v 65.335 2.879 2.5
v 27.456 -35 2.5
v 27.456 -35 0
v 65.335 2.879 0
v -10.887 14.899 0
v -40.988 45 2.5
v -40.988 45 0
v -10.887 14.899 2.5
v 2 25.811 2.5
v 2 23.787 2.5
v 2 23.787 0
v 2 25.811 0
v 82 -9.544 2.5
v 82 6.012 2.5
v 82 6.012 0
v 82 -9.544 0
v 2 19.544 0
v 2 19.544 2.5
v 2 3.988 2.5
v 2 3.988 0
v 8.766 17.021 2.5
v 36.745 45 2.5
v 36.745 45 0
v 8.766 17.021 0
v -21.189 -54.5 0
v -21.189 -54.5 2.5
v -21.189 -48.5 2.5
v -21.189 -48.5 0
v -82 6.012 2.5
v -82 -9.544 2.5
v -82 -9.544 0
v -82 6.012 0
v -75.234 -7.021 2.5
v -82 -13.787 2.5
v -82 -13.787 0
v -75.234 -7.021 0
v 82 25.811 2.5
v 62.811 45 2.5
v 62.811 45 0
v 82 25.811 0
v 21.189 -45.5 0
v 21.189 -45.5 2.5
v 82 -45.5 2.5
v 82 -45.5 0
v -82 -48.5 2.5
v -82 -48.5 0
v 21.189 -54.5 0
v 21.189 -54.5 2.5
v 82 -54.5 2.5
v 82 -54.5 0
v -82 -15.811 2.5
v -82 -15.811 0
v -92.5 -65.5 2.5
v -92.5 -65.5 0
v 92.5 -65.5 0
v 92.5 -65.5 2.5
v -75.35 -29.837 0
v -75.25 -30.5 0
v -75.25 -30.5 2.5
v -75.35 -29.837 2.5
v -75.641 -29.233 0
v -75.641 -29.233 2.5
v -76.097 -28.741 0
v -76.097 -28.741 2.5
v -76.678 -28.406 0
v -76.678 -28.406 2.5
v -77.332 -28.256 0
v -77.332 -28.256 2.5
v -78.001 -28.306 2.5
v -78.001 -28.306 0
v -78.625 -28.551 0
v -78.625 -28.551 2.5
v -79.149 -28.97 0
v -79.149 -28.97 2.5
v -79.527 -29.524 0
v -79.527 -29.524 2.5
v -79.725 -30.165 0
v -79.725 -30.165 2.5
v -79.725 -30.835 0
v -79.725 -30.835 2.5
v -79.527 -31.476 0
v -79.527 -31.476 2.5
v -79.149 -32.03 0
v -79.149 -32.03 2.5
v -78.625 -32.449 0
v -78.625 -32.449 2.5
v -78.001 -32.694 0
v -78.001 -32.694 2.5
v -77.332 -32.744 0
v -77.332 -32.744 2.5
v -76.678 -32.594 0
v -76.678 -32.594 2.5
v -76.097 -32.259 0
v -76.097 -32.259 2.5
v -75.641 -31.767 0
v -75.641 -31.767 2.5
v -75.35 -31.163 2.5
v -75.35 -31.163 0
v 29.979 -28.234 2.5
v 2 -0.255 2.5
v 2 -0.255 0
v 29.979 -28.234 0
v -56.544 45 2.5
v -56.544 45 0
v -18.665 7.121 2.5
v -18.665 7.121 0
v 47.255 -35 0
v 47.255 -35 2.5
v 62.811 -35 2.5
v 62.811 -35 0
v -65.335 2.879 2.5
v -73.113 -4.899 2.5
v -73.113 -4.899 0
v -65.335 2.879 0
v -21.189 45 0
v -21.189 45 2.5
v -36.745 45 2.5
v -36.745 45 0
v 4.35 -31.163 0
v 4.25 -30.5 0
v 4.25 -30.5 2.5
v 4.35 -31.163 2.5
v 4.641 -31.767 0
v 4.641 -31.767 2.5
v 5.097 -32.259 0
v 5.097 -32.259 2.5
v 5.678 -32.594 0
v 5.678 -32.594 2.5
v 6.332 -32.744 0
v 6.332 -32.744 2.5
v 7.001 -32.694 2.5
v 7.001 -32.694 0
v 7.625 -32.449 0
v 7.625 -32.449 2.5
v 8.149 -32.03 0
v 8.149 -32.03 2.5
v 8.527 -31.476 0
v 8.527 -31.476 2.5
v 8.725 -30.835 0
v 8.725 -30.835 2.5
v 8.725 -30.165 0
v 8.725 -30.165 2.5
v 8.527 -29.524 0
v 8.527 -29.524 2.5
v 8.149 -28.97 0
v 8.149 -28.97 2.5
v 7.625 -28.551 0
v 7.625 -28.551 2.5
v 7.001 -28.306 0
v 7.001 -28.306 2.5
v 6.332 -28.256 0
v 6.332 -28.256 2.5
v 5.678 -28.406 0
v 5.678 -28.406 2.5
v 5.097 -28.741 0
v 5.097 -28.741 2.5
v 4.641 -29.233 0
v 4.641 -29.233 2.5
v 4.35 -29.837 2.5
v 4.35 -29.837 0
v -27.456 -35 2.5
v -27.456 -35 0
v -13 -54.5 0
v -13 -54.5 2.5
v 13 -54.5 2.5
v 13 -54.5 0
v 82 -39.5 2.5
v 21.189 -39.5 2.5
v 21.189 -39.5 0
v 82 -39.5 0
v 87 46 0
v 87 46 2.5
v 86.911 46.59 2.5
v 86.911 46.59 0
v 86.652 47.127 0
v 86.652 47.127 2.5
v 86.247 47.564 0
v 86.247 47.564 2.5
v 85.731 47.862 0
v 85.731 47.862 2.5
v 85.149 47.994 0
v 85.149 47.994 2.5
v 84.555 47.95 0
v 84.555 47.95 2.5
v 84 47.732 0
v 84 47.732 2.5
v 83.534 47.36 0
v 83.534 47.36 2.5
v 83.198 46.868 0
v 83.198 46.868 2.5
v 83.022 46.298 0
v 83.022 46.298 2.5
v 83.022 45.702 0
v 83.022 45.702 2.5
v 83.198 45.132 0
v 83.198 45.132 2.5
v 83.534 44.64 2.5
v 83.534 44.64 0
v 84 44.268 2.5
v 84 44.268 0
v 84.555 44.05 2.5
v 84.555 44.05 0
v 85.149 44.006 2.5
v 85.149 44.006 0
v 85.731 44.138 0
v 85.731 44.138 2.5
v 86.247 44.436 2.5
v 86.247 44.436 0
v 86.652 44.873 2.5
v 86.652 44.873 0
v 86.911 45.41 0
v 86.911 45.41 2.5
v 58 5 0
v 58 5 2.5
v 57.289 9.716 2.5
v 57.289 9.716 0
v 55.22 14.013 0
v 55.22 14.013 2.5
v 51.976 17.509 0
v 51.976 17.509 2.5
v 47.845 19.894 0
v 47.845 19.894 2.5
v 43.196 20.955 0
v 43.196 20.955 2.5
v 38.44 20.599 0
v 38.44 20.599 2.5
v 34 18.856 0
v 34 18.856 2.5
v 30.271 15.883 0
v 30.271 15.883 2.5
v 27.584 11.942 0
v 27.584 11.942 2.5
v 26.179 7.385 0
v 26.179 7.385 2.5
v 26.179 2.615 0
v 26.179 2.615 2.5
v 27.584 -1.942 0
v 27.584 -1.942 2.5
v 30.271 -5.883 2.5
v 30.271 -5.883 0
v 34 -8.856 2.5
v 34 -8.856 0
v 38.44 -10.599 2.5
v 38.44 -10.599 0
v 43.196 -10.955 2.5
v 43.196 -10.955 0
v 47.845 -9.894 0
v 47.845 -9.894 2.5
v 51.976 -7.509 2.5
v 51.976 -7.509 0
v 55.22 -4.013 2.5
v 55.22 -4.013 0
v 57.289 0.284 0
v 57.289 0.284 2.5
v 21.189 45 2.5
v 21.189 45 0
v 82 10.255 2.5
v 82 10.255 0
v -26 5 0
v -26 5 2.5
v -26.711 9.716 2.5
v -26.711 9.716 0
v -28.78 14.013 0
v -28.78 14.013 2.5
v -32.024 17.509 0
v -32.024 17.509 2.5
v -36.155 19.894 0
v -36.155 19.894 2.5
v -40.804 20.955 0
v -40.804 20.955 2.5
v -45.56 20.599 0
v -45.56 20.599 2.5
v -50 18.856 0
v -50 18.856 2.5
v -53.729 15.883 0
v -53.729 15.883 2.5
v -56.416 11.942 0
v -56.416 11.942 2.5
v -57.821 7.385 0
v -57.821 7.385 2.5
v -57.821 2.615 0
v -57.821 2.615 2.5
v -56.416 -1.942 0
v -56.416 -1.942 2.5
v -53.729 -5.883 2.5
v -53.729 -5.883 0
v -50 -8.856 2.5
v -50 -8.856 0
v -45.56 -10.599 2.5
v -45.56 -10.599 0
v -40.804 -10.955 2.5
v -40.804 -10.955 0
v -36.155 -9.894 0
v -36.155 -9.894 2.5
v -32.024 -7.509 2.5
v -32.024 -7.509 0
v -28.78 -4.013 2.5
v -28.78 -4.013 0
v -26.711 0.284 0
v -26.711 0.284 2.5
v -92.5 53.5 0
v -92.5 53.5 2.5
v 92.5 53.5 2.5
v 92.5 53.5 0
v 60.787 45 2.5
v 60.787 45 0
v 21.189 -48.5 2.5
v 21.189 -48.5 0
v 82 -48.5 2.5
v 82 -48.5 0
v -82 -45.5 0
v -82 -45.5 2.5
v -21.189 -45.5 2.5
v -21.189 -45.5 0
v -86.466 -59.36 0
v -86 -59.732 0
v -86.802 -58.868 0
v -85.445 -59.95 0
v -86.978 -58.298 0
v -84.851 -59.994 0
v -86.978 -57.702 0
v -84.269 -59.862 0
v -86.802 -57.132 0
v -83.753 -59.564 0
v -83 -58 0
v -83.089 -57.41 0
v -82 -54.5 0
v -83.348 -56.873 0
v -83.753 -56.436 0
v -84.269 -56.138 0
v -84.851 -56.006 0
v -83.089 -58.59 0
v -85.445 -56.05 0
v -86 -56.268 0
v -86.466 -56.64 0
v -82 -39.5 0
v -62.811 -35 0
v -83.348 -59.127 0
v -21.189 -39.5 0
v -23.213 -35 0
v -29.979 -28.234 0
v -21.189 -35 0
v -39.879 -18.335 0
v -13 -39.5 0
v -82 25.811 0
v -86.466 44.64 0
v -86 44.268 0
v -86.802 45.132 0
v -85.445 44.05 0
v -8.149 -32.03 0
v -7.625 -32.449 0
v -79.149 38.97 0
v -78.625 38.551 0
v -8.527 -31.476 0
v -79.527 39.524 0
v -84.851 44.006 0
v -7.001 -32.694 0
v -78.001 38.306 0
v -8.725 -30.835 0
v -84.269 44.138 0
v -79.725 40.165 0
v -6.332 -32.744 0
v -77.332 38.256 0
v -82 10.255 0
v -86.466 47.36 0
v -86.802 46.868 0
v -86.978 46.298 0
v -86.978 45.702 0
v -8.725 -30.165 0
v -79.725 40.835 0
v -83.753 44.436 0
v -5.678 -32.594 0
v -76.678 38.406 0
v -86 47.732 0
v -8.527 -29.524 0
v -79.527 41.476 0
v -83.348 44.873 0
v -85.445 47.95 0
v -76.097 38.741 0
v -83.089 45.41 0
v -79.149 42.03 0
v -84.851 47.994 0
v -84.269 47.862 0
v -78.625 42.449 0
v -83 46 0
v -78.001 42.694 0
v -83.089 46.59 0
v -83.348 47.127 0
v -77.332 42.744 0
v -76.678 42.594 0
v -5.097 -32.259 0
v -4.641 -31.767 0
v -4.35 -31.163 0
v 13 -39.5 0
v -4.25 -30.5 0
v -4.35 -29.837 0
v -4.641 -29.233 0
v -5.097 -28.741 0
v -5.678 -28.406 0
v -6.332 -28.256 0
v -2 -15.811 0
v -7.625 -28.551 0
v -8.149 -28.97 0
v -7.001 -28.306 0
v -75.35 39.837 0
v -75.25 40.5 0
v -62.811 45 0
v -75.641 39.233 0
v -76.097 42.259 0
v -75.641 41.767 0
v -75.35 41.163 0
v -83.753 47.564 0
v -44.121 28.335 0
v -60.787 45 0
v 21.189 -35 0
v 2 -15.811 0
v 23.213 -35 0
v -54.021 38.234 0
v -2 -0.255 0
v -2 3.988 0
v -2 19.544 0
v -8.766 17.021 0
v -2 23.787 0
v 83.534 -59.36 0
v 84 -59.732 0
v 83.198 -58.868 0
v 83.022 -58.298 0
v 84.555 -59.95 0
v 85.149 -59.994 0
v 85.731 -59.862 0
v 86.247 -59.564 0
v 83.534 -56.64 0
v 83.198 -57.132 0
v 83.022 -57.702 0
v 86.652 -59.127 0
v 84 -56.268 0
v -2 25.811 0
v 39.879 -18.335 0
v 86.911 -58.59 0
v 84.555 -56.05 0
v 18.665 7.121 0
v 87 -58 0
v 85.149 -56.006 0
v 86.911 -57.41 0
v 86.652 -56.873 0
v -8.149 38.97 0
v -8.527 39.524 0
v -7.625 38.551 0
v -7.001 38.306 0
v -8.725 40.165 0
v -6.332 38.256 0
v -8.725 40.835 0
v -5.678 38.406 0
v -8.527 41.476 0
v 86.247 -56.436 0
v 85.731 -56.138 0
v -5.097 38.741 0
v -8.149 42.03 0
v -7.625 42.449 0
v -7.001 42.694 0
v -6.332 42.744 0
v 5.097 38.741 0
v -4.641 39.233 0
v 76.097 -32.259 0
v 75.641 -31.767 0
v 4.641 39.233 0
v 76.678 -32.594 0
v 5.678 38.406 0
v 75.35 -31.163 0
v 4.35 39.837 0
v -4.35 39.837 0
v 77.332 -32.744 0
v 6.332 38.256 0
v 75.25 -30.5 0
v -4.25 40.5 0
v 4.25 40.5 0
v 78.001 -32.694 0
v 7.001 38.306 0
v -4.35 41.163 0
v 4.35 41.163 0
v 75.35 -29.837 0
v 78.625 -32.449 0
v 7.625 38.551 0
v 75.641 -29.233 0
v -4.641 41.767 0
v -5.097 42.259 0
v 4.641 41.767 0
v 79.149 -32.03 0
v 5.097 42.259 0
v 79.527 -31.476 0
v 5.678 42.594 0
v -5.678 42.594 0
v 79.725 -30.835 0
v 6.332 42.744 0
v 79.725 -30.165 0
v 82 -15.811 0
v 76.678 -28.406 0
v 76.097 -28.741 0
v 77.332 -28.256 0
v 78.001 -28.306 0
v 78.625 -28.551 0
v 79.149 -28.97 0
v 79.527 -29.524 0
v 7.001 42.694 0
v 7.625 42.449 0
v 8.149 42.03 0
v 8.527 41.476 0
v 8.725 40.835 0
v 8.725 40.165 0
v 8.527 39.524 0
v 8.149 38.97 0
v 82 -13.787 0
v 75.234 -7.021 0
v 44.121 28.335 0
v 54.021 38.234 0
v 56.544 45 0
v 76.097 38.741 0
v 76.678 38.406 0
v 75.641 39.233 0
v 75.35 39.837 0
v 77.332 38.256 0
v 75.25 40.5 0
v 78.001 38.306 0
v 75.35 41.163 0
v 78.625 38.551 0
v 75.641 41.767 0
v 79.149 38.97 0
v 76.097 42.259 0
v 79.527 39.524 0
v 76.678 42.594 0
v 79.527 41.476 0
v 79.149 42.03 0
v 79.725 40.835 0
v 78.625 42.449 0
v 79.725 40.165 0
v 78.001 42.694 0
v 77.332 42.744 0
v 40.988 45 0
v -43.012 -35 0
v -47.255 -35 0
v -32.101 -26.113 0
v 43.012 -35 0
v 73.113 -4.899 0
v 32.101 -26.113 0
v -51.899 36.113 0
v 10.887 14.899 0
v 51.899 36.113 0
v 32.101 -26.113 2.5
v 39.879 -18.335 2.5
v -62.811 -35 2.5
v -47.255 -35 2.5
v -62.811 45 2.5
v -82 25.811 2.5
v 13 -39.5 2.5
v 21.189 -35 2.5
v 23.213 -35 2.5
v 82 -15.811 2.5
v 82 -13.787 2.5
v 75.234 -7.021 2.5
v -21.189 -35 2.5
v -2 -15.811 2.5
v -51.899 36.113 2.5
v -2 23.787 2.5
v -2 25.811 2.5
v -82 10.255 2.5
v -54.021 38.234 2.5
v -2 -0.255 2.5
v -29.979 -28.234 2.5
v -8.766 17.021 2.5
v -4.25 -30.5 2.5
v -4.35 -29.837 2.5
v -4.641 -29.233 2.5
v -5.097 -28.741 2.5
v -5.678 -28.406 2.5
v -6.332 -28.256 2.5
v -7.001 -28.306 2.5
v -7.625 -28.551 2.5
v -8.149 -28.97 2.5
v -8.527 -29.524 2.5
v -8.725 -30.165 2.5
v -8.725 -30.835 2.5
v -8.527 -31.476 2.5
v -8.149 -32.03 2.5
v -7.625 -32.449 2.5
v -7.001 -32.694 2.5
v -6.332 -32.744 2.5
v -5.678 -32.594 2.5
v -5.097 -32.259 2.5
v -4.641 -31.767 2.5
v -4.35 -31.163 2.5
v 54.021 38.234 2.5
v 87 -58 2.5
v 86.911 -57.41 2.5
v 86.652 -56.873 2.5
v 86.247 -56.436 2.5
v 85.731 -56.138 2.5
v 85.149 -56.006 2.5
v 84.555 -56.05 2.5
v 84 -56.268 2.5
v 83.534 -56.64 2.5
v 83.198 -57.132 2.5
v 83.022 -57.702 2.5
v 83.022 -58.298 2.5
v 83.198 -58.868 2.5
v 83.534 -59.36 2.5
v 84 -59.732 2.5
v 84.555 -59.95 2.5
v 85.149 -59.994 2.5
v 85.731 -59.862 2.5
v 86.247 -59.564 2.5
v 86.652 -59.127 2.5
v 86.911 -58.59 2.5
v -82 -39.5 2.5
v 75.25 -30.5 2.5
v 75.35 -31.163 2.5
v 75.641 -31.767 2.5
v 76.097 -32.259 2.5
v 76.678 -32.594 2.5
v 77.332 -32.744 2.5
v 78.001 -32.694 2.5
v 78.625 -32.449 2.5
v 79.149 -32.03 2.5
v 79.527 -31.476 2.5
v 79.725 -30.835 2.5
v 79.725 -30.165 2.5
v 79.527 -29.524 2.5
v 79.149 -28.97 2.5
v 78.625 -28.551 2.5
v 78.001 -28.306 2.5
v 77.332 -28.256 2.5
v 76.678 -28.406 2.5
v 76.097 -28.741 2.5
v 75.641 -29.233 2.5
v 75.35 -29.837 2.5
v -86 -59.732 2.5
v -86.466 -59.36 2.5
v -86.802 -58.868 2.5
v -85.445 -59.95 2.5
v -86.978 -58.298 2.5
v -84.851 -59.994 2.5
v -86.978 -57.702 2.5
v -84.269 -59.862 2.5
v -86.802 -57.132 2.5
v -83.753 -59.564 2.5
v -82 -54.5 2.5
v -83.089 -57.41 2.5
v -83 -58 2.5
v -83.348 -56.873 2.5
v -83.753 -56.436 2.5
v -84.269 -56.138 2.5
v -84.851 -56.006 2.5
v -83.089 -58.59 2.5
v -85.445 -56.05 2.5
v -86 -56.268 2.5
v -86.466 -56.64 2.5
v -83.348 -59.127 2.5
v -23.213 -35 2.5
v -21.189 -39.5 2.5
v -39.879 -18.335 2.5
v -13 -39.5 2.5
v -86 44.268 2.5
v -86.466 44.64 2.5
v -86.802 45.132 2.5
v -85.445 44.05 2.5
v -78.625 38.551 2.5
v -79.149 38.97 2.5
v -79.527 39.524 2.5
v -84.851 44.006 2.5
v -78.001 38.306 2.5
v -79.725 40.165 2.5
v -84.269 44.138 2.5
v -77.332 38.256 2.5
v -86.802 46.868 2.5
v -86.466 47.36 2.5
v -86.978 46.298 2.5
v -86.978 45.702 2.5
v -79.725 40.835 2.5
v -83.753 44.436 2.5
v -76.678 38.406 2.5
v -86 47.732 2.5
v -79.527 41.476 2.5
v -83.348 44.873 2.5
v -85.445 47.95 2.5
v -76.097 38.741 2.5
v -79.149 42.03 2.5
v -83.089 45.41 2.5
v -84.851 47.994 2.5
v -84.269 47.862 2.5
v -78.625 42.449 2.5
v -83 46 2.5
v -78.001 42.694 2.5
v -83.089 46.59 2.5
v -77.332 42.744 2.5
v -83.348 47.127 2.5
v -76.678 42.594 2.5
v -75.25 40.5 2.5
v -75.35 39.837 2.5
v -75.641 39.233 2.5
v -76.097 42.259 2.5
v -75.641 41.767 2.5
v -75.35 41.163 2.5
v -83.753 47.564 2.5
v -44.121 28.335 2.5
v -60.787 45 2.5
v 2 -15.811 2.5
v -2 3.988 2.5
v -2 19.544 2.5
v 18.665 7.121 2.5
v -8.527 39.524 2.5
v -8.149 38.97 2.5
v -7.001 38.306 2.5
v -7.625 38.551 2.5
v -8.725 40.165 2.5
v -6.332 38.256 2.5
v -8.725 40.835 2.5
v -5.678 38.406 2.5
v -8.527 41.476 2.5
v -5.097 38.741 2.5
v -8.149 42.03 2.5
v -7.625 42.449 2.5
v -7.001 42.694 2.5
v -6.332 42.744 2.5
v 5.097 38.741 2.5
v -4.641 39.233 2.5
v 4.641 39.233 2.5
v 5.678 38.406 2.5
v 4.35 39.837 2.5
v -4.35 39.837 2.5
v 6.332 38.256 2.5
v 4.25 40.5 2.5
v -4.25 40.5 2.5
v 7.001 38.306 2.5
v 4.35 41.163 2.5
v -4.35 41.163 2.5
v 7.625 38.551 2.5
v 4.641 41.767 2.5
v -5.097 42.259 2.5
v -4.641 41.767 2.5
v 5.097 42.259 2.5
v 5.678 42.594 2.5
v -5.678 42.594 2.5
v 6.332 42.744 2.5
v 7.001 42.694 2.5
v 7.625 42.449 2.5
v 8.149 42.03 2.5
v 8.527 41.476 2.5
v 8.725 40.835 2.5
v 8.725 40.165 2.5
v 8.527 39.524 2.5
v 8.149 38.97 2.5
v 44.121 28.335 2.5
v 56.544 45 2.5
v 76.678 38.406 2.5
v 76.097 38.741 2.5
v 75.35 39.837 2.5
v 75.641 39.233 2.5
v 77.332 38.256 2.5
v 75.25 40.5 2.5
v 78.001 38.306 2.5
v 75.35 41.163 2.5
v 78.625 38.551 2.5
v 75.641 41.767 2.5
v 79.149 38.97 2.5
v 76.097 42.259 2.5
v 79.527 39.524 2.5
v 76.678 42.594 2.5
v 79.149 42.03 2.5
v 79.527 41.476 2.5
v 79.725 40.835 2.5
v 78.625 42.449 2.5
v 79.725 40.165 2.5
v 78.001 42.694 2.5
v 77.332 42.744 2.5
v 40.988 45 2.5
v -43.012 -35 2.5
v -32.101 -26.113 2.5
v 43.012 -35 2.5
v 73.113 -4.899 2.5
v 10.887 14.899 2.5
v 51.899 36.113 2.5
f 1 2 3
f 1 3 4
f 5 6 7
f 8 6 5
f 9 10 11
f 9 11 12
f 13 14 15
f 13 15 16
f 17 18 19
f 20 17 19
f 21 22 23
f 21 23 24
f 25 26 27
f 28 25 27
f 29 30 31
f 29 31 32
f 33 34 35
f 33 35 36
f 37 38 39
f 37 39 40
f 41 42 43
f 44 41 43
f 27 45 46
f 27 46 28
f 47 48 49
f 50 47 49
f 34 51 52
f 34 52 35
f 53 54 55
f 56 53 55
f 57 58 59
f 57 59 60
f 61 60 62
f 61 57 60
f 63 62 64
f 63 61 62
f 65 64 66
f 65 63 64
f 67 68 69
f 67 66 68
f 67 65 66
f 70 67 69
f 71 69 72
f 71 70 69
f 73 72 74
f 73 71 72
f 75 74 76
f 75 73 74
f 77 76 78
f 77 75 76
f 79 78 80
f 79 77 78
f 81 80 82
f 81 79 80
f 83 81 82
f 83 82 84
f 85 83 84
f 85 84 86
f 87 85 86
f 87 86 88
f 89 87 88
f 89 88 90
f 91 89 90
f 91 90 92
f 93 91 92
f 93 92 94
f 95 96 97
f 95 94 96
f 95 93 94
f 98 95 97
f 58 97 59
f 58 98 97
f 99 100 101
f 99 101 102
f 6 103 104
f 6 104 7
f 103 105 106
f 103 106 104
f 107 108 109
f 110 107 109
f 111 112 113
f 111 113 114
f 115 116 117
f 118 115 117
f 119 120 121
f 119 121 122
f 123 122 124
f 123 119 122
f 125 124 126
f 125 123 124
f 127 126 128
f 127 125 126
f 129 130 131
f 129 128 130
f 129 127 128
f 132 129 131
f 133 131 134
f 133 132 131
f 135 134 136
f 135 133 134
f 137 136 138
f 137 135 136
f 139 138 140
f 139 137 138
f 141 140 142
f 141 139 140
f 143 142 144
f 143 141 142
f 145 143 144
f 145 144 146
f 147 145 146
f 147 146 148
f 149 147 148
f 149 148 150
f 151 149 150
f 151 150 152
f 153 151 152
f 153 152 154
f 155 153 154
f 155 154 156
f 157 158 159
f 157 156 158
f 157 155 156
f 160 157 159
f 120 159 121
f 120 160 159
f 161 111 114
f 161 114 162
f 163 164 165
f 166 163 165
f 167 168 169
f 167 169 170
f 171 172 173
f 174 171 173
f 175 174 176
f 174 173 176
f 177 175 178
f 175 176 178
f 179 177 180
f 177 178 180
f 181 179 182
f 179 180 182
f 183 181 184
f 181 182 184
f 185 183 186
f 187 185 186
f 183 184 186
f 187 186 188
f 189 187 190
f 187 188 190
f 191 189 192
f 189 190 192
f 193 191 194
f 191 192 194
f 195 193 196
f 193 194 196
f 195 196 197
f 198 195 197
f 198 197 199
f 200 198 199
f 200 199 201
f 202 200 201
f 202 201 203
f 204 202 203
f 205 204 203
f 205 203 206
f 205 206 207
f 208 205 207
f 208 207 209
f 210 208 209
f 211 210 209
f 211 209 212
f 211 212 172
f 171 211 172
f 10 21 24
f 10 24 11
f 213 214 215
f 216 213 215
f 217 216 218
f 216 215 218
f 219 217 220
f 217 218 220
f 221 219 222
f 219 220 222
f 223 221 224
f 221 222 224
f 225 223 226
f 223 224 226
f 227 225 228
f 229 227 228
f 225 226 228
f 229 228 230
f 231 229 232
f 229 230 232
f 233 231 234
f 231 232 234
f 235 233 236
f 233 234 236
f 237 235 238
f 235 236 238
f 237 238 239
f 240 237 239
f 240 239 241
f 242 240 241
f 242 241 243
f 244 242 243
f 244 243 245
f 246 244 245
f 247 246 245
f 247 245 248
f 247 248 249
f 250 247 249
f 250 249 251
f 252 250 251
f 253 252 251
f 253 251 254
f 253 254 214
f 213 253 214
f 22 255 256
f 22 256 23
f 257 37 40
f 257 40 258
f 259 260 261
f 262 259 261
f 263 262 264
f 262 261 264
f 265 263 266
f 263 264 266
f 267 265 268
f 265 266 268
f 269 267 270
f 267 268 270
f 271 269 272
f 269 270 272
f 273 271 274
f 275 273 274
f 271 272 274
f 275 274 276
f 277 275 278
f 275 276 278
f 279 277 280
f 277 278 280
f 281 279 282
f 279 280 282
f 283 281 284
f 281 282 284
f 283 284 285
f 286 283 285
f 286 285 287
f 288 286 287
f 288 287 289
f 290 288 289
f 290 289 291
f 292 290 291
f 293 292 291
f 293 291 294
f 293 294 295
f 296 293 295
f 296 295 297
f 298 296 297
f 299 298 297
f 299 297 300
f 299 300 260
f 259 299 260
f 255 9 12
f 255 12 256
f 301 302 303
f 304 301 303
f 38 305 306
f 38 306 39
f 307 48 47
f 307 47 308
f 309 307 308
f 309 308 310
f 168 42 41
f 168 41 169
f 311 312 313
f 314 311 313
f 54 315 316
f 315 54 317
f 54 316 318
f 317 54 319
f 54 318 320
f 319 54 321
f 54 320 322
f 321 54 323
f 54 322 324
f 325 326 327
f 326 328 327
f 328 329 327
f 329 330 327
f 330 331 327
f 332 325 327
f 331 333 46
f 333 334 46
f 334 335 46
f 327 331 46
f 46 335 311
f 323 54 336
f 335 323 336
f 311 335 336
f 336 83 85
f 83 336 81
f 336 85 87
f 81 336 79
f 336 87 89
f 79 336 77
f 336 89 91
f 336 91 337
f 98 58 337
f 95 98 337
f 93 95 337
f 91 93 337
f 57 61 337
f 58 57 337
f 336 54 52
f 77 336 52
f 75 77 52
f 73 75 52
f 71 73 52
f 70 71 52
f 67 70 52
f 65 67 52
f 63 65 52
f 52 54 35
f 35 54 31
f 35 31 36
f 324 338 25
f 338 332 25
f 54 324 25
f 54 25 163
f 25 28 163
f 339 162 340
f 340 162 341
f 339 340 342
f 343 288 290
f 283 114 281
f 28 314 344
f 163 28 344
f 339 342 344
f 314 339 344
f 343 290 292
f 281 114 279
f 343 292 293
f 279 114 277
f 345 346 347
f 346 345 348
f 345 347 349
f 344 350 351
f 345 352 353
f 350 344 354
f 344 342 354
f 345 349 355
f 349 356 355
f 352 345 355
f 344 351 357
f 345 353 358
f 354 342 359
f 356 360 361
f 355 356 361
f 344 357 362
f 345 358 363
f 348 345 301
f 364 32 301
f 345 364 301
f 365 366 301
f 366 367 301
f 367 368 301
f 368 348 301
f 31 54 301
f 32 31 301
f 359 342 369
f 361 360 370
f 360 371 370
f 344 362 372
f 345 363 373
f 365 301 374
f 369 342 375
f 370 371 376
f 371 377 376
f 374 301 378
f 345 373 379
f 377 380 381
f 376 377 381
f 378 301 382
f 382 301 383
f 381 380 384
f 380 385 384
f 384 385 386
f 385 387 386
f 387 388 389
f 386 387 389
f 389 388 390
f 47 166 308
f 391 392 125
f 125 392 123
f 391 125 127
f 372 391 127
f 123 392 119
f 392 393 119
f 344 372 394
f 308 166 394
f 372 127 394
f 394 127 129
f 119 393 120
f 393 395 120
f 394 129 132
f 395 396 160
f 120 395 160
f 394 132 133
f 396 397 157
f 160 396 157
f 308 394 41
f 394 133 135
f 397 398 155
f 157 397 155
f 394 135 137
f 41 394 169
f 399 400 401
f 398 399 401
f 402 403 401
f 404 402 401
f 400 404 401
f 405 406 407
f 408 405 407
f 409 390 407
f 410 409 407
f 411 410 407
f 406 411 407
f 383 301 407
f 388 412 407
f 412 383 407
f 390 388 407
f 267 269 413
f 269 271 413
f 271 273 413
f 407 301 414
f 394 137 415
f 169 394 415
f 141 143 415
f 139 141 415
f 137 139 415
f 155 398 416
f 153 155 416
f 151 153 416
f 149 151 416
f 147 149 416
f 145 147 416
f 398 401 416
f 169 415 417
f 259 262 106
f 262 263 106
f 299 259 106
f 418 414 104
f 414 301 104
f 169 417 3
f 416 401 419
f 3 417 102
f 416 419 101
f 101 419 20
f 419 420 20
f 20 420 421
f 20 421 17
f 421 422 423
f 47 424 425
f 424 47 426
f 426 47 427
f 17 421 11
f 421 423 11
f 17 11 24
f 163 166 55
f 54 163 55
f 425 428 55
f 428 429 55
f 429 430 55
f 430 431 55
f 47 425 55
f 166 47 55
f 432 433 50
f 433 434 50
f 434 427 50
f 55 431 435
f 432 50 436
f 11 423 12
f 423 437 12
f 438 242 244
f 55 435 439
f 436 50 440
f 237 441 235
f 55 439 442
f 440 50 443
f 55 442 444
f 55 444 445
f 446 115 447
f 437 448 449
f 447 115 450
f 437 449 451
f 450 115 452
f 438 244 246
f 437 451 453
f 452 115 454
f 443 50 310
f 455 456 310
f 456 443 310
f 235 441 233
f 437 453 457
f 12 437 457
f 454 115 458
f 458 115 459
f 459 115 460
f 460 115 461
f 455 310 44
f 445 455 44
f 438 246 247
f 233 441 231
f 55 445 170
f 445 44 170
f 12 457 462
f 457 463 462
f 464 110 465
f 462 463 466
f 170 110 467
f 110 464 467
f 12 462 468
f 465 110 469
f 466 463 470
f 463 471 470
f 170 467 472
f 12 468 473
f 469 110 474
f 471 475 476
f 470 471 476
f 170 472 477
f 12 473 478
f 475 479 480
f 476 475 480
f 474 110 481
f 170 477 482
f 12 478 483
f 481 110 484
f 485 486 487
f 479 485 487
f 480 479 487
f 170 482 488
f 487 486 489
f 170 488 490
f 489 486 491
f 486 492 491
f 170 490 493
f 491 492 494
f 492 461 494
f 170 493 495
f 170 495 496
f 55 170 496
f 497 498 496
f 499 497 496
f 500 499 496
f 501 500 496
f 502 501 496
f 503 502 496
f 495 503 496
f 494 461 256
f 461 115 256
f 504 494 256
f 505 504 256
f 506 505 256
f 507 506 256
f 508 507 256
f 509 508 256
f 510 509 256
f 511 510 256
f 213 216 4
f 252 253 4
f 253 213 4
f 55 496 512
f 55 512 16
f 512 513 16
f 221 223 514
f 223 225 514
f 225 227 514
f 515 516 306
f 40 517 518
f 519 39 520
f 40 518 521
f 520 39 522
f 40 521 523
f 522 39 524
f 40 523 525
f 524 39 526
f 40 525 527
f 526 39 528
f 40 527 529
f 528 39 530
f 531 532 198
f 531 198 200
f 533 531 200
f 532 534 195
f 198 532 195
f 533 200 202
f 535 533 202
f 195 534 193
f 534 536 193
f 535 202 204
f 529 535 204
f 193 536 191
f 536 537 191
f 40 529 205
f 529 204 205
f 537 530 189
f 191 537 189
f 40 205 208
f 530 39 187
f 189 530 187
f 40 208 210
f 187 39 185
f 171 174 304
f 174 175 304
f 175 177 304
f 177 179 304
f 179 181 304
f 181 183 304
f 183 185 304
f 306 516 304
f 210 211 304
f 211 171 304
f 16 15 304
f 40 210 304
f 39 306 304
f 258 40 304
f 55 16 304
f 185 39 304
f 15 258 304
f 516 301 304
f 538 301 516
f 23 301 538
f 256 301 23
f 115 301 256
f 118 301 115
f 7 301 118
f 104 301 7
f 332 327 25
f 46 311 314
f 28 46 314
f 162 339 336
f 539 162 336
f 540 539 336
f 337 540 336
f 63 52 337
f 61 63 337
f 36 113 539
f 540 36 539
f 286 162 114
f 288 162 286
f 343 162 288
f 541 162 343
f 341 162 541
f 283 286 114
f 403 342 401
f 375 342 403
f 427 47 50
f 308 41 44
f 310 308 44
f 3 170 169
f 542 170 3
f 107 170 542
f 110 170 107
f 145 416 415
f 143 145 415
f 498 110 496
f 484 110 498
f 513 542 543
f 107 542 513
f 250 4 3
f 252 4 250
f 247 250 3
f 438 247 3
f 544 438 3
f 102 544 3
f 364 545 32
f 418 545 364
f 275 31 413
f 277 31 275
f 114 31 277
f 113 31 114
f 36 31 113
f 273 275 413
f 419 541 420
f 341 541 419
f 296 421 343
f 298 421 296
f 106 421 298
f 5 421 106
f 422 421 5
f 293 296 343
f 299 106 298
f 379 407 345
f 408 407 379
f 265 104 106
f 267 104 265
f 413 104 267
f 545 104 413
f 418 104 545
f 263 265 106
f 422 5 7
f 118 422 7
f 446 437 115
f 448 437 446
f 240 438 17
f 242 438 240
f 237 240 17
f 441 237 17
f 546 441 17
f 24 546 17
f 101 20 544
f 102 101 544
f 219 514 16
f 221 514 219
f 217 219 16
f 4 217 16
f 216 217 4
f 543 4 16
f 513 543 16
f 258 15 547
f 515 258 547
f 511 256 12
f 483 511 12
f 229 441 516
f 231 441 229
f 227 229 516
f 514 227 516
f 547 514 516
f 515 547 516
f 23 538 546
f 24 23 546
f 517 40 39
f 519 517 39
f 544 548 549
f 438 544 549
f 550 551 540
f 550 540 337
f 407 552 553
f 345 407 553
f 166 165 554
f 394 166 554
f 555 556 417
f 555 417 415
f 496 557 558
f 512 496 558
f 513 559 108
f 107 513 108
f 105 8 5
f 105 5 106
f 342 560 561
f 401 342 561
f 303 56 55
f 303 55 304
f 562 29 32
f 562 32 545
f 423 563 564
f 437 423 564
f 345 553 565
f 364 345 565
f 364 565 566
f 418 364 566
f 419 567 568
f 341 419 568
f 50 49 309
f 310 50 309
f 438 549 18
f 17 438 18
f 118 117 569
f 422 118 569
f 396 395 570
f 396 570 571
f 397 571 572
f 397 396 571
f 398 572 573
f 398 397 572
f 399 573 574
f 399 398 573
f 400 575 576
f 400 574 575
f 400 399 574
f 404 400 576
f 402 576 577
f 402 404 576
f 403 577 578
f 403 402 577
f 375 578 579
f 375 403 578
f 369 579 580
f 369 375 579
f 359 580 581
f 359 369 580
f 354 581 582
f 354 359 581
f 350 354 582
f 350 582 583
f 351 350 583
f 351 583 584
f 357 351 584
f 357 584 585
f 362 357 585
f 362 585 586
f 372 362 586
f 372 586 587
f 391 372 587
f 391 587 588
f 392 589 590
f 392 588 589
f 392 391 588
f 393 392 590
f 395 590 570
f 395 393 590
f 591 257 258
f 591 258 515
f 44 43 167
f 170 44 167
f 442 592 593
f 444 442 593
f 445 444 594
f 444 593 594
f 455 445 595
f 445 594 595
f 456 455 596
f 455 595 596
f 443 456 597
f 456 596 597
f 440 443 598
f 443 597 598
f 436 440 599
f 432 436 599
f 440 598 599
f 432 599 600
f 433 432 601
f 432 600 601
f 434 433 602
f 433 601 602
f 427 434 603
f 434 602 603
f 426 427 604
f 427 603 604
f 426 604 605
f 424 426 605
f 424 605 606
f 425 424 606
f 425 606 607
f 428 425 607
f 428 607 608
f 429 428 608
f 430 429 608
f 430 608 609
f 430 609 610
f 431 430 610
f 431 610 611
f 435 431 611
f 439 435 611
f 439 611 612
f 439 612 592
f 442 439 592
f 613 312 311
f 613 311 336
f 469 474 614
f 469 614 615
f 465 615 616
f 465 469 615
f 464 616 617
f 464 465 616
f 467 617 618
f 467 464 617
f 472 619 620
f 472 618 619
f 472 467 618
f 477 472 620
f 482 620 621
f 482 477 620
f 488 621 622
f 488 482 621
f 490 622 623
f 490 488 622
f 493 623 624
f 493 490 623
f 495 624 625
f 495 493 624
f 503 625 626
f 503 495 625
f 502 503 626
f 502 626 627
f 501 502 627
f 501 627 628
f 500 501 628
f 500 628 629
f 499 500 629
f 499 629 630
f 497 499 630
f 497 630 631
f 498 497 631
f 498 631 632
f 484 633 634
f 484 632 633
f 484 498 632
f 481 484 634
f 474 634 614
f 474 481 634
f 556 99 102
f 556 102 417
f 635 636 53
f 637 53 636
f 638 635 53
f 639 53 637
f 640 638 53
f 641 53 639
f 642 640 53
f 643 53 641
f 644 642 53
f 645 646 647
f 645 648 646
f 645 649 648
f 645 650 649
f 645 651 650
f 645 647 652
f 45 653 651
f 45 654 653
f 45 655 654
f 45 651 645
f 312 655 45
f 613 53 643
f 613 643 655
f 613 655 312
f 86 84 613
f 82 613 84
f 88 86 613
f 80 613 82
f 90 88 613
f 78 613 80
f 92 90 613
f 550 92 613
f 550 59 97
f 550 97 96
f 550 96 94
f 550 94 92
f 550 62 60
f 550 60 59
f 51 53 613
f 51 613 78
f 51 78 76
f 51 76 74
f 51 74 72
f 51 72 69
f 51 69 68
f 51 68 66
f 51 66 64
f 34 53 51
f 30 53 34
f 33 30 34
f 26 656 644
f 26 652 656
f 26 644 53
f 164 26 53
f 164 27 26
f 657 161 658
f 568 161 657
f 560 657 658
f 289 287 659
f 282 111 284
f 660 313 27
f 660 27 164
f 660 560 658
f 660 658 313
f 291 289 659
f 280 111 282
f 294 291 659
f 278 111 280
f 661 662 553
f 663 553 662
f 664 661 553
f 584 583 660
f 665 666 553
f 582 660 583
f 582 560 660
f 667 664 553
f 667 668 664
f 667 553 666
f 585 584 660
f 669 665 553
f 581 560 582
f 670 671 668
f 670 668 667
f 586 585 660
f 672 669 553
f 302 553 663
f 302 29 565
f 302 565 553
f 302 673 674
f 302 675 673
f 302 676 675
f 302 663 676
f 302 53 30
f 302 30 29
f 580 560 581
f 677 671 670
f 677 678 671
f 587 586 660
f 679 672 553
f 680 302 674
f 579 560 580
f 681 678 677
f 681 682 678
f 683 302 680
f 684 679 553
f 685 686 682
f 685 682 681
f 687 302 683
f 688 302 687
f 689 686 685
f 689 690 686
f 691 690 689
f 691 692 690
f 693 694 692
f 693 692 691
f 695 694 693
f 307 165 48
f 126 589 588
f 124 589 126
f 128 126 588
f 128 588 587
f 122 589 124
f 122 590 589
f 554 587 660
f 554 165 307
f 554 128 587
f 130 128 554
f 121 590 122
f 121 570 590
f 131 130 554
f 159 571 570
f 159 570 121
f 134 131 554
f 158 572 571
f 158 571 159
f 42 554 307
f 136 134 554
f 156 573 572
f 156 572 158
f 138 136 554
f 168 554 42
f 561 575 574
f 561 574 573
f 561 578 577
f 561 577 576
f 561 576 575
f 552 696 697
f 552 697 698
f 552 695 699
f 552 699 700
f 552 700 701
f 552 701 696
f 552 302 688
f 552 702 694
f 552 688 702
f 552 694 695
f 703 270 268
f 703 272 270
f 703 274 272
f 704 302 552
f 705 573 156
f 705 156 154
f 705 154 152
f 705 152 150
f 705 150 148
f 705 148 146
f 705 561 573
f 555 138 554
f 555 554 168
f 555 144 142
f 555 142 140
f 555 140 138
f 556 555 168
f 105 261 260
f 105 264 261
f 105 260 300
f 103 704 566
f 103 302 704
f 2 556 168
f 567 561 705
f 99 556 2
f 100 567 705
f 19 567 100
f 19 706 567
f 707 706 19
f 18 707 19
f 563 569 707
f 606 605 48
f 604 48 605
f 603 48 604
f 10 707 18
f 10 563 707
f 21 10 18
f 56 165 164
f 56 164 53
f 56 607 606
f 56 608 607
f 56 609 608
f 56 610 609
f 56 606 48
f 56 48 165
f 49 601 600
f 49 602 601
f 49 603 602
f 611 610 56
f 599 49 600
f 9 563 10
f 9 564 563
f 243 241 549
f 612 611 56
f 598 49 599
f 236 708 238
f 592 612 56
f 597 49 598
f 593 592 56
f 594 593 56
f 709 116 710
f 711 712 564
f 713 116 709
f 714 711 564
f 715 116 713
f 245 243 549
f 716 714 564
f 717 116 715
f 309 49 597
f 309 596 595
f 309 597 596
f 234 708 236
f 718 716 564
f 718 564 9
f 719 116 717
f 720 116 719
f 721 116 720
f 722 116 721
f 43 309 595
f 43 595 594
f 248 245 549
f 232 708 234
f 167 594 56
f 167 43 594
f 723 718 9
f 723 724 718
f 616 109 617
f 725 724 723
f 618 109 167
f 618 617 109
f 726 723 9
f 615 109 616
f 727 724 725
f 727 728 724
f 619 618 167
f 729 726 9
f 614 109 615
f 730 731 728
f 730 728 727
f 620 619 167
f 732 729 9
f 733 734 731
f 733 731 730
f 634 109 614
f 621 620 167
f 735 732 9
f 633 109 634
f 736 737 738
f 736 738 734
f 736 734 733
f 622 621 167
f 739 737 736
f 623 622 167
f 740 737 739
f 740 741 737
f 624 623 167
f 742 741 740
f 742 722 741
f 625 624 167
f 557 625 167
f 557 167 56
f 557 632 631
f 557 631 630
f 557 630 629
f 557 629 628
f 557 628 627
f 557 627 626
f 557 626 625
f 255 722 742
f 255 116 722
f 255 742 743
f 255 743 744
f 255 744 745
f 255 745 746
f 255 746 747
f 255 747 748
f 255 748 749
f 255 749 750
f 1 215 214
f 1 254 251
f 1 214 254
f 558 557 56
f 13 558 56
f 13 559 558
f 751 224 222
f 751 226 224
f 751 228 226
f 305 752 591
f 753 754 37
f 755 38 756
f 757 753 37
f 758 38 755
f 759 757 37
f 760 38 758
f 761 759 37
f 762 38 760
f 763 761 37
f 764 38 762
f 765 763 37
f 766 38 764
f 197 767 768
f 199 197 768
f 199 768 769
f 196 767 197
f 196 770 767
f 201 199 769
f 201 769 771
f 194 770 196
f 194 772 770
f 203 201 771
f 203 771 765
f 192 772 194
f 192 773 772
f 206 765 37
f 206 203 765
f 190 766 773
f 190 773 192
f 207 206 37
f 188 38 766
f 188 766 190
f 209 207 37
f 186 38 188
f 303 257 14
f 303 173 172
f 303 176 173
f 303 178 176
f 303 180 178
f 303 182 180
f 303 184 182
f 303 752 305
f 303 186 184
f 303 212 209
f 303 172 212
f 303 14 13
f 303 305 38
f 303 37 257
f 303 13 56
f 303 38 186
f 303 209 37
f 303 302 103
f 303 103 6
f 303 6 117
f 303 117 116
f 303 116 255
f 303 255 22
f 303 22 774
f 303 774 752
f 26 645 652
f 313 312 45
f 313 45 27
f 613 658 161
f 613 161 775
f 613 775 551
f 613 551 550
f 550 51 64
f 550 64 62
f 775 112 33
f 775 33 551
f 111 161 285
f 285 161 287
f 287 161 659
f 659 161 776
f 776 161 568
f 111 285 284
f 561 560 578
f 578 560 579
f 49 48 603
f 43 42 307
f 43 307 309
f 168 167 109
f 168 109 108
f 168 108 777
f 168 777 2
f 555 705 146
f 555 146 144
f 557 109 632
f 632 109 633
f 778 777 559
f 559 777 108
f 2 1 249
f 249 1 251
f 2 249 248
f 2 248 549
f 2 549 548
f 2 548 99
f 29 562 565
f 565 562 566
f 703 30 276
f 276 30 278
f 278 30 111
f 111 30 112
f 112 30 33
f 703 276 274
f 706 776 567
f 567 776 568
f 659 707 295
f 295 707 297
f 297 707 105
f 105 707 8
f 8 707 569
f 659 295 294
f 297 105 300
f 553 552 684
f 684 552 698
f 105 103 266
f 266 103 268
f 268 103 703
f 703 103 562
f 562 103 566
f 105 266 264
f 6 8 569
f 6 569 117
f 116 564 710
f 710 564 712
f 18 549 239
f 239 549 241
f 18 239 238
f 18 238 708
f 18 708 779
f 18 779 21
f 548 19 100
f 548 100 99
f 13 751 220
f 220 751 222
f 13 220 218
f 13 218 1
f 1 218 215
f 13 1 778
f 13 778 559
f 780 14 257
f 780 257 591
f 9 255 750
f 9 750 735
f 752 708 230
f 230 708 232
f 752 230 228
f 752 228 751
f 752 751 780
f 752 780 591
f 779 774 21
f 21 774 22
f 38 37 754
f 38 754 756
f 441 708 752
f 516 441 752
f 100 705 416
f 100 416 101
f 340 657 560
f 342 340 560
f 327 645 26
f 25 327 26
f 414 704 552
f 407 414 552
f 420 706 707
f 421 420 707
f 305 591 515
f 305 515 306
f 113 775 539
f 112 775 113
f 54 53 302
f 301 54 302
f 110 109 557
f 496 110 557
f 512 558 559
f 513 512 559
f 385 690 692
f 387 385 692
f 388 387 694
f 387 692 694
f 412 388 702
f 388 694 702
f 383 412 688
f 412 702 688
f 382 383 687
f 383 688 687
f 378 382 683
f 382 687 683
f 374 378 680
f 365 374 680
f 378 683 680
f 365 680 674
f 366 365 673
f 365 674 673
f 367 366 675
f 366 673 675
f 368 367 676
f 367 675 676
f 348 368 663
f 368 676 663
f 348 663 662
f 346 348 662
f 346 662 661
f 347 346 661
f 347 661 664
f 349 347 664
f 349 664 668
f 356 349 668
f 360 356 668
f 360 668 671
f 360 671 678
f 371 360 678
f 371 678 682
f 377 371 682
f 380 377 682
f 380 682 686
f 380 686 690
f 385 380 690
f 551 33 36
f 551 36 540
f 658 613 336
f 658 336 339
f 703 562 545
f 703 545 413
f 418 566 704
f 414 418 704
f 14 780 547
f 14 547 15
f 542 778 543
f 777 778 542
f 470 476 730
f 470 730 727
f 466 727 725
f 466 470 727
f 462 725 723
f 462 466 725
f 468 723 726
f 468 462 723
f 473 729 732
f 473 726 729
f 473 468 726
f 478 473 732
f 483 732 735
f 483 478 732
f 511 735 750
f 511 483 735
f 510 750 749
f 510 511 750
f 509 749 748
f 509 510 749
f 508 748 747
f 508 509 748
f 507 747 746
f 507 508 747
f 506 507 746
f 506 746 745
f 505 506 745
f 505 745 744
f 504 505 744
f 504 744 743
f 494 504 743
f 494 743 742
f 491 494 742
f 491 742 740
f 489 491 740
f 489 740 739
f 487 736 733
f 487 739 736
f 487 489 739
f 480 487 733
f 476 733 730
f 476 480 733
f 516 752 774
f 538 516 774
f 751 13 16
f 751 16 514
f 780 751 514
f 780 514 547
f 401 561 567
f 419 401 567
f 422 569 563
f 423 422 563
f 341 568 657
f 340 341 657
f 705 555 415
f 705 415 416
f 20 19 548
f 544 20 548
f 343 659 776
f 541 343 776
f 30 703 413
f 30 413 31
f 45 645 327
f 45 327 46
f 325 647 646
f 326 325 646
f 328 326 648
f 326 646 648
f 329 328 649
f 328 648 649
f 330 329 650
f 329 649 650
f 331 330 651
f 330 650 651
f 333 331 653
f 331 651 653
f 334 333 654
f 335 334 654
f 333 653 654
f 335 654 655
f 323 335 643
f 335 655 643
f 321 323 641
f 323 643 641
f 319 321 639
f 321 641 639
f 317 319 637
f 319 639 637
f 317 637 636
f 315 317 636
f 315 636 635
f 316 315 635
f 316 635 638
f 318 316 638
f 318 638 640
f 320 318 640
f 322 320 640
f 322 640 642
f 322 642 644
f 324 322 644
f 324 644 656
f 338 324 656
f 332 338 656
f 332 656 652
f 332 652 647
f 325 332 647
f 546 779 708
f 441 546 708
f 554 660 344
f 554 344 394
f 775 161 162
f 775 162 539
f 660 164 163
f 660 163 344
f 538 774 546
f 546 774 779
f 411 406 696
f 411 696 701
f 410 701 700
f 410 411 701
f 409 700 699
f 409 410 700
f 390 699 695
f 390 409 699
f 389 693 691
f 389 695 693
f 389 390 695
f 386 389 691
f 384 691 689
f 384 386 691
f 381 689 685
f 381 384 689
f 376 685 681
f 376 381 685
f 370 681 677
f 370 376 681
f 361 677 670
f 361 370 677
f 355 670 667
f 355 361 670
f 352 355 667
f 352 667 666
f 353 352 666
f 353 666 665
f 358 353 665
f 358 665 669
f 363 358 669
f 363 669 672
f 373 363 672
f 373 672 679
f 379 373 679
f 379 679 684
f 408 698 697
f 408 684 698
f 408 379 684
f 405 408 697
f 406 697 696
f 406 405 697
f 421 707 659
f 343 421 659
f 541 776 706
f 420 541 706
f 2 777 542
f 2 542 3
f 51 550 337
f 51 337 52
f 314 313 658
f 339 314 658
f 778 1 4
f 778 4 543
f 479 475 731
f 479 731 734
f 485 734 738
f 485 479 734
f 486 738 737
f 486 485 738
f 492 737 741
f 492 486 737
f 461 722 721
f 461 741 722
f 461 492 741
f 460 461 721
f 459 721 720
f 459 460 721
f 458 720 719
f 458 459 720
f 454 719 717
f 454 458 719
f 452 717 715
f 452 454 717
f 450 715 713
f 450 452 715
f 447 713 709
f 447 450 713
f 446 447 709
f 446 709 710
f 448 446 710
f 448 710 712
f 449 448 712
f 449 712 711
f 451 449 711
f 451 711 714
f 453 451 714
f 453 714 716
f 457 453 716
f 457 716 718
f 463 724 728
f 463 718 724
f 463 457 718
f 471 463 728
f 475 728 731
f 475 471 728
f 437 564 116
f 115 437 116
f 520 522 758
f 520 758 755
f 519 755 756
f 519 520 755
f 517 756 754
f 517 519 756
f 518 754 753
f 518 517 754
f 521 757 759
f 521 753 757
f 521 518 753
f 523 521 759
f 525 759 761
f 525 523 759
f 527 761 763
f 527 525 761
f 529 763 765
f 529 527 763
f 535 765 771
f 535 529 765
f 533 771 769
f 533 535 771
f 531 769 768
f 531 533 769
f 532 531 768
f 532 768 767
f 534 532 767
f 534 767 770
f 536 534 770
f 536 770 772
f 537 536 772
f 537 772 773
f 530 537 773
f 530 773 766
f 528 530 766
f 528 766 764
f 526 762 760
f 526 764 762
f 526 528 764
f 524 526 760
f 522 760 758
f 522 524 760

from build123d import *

# Parameters (mm, degrees)
SKETCH1_W               = 185
SKETCH1_H               = 115
BOSS_EXTRUDE1_DEPTH     = 2.5
SKETCH2_R               = 16
CUT_EXTRUDE1_DEPTH      = 114.369969569
SKETCH5_W               = 26
SKETCH5_H               = 15
CUT_EXTRUDE4_DEPTH      = 10
CUT_EXTRUDE7_DEPTH      = 10
SKETCH9_W               = 60.811183182
SKETCH9_H               = 6
CUT_EXTRUDE8_DEPTH      = 10
CUT_EXTRUDE9_DEPTH      = 114.369969569
CUT_EXTRUDE9_DEPTH_BACK = 114.369969569
SKETCH10_R              = 2.25
SKETCH11_R              = 2
CUT_EXTRUDE11_DEPTH     = 114.369969569
SKETCH12_W              = 185
SKETCH12_H              = 4
BOSS_EXTRUDE2_DEPTH     = 2.5


with BuildPart() as part:
    # Sketch1 → Boss-Extrude1 (new body)
    with BuildSketch(Plane.XY):
        with Locations((0, -8)):
            Rectangle(SKETCH1_W, SKETCH1_H)
    extrude(amount=BOSS_EXTRUDE1_DEPTH)

    # Sketch2 → Cut-Extrude1 (cut, through all)
    with BuildSketch(Plane.XY.offset(2.5)):
        with Locations((-42, 5)):
            Circle(SKETCH2_R)
        with Locations((42, 5)):
            Circle(SKETCH2_R)
    extrude(amount=-CUT_EXTRUDE1_DEPTH, mode=Mode.SUBTRACT)

    # Sketch5 → Cut-Extrude4 (cut)
    with BuildSketch(Plane.XY.offset(2.5)):
        with Locations((0, -47)):
            Rectangle(SKETCH5_W, SKETCH5_H)
    extrude(amount=-CUT_EXTRUDE4_DEPTH, mode=Mode.SUBTRACT)

    # Sketch8 → Cut-Extrude7 (cut)
    with BuildSketch(Plane.XY.offset(2.5)):
        Polygon((-82, 10.254833996), (-54.02081528, 38.234018716), (-60.786796564, 45), (-62.811183182, 45), (-82, 25.811183182), align=None)
        Polygon((-82, 6.012193309), (-51.899494937, 36.112698372), (-44.121320344, 28.334523779), (-82, -9.544155877), align=None)
        Polygon((-21.188816818, -35), (-2, -15.811183182), (-2, -0.254833996), (-29.97918472, -28.234018716), (-23.213203436, -35), align=None)
        Polygon((-43.012193309, -35), (-73.112698372, -4.899494937), (-65.334523779, 2.878679656), (-27.455844123, -35), align=None)
        Polygon((-82, -13.786796564), (-75.234018716, -7.02081528), (-47.254833996, -35), (-62.811183182, -35), (-82, -15.811183182), align=None)
        Polygon((-18.665476221, 7.121320344), (-56.544155877, 45), (-40.987806691, 45), (-10.887301628, 14.899494937), align=None)
        Polygon((-2, 25.811183182), (-21.188816818, 45), (-36.745166004, 45), (-8.765981284, 17.02081528), (-2, 23.786796564), align=None)
        Polygon((-2, 3.987806691), (-2, 19.544155877), (-39.878679656, -18.334523779), (-32.100505063, -26.112698372), align=None)
        Polygon((39.878679656, -18.334523779), (2, 19.544155877), (2, 3.987806691), (32.100505063, -26.112698372), align=None)
        Polygon((29.97918472, -28.234018716), (23.213203436, -35), (21.188816818, -35), (2, -15.811183182), (2, -0.254833996), align=None)
        Polygon((54.02081528, 38.234018716), (60.786796564, 45), (62.811183182, 45), (82, 25.811183182), (82, 10.254833996), align=None)
        Polygon((2, 23.786796564), (2, 25.811183182), (21.188816818, 45), (36.745166004, 45), (8.765981284, 17.02081528), align=None)
        Polygon((56.544155877, 45), (40.987806691, 45), (10.887301628, 14.899494937), (18.665476221, 7.121320344), align=None)
        Polygon((44.121320344, 28.334523779), (51.899494937, 36.112698372), (82, 6.012193309), (82, -9.544155877), align=None)
        Polygon((62.811183182, -35), (82, -15.811183182), (82, -13.786796564), (75.234018716, -7.02081528), (47.254833996, -35), align=None)
        Polygon((43.012193309, -35), (27.455844123, -35), (65.334523779, 2.878679656), (73.112698372, -4.899494937), align=None)
    extrude(amount=-CUT_EXTRUDE7_DEPTH, mode=Mode.SUBTRACT)

    # Sketch9 → Cut-Extrude8 (cut)
    with BuildSketch(Plane.XY.offset(2.5)):
        with Locations((-51.594408409, -42.5)):
            Rectangle(SKETCH9_W, SKETCH9_H)
        with Locations((51.594408409, -42.5)):
            Rectangle(SKETCH9_W, SKETCH9_H)
        with Locations((-51.594408409, -51.5)):
            Rectangle(SKETCH9_W, SKETCH9_H)
        with Locations((51.594408409, -51.5)):
            Rectangle(SKETCH9_W, SKETCH9_H)
    extrude(amount=-CUT_EXTRUDE8_DEPTH, mode=Mode.SUBTRACT)

    # Sketch10 → Cut-Extrude9 (cut, two sides: drawn at the far end of the back side and taken through both)
    with BuildSketch(Plane.XY.offset(2.5).offset(-CUT_EXTRUDE9_DEPTH_BACK)):
        with Locations((-77.5, 40.5)):
            Circle(SKETCH10_R)
        with Locations((-6.5, 40.5)):
            Circle(SKETCH10_R)
        with Locations((-6.5, -30.5)):
            Circle(SKETCH10_R)
        with Locations((-77.5, -30.5)):
            Circle(SKETCH10_R)
        with Locations(Location((77.5, -30.5, 0), (0, 0, 180))):
            Circle(SKETCH10_R)
        with Locations(Location((6.5, -30.5, 0), (0, 0, 180))):
            Circle(SKETCH10_R)
        with Locations(Location((6.5, 40.5, 0), (0, 0, 180))):
            Circle(SKETCH10_R)
        with Locations(Location((77.5, 40.5, 0), (0, 0, 180))):
            Circle(SKETCH10_R)
    extrude(amount=CUT_EXTRUDE9_DEPTH + CUT_EXTRUDE9_DEPTH_BACK, mode=Mode.SUBTRACT)

    # Sketch11 → Cut-Extrude11 (cut, through all)
    with BuildSketch(Plane.XY.offset(2.5)):
        with Locations((-85, 46)):
            Circle(SKETCH11_R)
        with Locations((85, 46)):
            Circle(SKETCH11_R)
        with Locations((85, -58)):
            Circle(SKETCH11_R)
        with Locations((-85, -58)):
            Circle(SKETCH11_R)
    extrude(amount=-CUT_EXTRUDE11_DEPTH, mode=Mode.SUBTRACT)

    # Sketch12 → Boss-Extrude2 (add)
    with BuildSketch(Plane.XY.offset(2.5)):
        with Locations((0, 51.5)):
            Rectangle(SKETCH12_W, SKETCH12_H)
    extrude(amount=-BOSS_EXTRUDE2_DEPTH)


solid = part.part
